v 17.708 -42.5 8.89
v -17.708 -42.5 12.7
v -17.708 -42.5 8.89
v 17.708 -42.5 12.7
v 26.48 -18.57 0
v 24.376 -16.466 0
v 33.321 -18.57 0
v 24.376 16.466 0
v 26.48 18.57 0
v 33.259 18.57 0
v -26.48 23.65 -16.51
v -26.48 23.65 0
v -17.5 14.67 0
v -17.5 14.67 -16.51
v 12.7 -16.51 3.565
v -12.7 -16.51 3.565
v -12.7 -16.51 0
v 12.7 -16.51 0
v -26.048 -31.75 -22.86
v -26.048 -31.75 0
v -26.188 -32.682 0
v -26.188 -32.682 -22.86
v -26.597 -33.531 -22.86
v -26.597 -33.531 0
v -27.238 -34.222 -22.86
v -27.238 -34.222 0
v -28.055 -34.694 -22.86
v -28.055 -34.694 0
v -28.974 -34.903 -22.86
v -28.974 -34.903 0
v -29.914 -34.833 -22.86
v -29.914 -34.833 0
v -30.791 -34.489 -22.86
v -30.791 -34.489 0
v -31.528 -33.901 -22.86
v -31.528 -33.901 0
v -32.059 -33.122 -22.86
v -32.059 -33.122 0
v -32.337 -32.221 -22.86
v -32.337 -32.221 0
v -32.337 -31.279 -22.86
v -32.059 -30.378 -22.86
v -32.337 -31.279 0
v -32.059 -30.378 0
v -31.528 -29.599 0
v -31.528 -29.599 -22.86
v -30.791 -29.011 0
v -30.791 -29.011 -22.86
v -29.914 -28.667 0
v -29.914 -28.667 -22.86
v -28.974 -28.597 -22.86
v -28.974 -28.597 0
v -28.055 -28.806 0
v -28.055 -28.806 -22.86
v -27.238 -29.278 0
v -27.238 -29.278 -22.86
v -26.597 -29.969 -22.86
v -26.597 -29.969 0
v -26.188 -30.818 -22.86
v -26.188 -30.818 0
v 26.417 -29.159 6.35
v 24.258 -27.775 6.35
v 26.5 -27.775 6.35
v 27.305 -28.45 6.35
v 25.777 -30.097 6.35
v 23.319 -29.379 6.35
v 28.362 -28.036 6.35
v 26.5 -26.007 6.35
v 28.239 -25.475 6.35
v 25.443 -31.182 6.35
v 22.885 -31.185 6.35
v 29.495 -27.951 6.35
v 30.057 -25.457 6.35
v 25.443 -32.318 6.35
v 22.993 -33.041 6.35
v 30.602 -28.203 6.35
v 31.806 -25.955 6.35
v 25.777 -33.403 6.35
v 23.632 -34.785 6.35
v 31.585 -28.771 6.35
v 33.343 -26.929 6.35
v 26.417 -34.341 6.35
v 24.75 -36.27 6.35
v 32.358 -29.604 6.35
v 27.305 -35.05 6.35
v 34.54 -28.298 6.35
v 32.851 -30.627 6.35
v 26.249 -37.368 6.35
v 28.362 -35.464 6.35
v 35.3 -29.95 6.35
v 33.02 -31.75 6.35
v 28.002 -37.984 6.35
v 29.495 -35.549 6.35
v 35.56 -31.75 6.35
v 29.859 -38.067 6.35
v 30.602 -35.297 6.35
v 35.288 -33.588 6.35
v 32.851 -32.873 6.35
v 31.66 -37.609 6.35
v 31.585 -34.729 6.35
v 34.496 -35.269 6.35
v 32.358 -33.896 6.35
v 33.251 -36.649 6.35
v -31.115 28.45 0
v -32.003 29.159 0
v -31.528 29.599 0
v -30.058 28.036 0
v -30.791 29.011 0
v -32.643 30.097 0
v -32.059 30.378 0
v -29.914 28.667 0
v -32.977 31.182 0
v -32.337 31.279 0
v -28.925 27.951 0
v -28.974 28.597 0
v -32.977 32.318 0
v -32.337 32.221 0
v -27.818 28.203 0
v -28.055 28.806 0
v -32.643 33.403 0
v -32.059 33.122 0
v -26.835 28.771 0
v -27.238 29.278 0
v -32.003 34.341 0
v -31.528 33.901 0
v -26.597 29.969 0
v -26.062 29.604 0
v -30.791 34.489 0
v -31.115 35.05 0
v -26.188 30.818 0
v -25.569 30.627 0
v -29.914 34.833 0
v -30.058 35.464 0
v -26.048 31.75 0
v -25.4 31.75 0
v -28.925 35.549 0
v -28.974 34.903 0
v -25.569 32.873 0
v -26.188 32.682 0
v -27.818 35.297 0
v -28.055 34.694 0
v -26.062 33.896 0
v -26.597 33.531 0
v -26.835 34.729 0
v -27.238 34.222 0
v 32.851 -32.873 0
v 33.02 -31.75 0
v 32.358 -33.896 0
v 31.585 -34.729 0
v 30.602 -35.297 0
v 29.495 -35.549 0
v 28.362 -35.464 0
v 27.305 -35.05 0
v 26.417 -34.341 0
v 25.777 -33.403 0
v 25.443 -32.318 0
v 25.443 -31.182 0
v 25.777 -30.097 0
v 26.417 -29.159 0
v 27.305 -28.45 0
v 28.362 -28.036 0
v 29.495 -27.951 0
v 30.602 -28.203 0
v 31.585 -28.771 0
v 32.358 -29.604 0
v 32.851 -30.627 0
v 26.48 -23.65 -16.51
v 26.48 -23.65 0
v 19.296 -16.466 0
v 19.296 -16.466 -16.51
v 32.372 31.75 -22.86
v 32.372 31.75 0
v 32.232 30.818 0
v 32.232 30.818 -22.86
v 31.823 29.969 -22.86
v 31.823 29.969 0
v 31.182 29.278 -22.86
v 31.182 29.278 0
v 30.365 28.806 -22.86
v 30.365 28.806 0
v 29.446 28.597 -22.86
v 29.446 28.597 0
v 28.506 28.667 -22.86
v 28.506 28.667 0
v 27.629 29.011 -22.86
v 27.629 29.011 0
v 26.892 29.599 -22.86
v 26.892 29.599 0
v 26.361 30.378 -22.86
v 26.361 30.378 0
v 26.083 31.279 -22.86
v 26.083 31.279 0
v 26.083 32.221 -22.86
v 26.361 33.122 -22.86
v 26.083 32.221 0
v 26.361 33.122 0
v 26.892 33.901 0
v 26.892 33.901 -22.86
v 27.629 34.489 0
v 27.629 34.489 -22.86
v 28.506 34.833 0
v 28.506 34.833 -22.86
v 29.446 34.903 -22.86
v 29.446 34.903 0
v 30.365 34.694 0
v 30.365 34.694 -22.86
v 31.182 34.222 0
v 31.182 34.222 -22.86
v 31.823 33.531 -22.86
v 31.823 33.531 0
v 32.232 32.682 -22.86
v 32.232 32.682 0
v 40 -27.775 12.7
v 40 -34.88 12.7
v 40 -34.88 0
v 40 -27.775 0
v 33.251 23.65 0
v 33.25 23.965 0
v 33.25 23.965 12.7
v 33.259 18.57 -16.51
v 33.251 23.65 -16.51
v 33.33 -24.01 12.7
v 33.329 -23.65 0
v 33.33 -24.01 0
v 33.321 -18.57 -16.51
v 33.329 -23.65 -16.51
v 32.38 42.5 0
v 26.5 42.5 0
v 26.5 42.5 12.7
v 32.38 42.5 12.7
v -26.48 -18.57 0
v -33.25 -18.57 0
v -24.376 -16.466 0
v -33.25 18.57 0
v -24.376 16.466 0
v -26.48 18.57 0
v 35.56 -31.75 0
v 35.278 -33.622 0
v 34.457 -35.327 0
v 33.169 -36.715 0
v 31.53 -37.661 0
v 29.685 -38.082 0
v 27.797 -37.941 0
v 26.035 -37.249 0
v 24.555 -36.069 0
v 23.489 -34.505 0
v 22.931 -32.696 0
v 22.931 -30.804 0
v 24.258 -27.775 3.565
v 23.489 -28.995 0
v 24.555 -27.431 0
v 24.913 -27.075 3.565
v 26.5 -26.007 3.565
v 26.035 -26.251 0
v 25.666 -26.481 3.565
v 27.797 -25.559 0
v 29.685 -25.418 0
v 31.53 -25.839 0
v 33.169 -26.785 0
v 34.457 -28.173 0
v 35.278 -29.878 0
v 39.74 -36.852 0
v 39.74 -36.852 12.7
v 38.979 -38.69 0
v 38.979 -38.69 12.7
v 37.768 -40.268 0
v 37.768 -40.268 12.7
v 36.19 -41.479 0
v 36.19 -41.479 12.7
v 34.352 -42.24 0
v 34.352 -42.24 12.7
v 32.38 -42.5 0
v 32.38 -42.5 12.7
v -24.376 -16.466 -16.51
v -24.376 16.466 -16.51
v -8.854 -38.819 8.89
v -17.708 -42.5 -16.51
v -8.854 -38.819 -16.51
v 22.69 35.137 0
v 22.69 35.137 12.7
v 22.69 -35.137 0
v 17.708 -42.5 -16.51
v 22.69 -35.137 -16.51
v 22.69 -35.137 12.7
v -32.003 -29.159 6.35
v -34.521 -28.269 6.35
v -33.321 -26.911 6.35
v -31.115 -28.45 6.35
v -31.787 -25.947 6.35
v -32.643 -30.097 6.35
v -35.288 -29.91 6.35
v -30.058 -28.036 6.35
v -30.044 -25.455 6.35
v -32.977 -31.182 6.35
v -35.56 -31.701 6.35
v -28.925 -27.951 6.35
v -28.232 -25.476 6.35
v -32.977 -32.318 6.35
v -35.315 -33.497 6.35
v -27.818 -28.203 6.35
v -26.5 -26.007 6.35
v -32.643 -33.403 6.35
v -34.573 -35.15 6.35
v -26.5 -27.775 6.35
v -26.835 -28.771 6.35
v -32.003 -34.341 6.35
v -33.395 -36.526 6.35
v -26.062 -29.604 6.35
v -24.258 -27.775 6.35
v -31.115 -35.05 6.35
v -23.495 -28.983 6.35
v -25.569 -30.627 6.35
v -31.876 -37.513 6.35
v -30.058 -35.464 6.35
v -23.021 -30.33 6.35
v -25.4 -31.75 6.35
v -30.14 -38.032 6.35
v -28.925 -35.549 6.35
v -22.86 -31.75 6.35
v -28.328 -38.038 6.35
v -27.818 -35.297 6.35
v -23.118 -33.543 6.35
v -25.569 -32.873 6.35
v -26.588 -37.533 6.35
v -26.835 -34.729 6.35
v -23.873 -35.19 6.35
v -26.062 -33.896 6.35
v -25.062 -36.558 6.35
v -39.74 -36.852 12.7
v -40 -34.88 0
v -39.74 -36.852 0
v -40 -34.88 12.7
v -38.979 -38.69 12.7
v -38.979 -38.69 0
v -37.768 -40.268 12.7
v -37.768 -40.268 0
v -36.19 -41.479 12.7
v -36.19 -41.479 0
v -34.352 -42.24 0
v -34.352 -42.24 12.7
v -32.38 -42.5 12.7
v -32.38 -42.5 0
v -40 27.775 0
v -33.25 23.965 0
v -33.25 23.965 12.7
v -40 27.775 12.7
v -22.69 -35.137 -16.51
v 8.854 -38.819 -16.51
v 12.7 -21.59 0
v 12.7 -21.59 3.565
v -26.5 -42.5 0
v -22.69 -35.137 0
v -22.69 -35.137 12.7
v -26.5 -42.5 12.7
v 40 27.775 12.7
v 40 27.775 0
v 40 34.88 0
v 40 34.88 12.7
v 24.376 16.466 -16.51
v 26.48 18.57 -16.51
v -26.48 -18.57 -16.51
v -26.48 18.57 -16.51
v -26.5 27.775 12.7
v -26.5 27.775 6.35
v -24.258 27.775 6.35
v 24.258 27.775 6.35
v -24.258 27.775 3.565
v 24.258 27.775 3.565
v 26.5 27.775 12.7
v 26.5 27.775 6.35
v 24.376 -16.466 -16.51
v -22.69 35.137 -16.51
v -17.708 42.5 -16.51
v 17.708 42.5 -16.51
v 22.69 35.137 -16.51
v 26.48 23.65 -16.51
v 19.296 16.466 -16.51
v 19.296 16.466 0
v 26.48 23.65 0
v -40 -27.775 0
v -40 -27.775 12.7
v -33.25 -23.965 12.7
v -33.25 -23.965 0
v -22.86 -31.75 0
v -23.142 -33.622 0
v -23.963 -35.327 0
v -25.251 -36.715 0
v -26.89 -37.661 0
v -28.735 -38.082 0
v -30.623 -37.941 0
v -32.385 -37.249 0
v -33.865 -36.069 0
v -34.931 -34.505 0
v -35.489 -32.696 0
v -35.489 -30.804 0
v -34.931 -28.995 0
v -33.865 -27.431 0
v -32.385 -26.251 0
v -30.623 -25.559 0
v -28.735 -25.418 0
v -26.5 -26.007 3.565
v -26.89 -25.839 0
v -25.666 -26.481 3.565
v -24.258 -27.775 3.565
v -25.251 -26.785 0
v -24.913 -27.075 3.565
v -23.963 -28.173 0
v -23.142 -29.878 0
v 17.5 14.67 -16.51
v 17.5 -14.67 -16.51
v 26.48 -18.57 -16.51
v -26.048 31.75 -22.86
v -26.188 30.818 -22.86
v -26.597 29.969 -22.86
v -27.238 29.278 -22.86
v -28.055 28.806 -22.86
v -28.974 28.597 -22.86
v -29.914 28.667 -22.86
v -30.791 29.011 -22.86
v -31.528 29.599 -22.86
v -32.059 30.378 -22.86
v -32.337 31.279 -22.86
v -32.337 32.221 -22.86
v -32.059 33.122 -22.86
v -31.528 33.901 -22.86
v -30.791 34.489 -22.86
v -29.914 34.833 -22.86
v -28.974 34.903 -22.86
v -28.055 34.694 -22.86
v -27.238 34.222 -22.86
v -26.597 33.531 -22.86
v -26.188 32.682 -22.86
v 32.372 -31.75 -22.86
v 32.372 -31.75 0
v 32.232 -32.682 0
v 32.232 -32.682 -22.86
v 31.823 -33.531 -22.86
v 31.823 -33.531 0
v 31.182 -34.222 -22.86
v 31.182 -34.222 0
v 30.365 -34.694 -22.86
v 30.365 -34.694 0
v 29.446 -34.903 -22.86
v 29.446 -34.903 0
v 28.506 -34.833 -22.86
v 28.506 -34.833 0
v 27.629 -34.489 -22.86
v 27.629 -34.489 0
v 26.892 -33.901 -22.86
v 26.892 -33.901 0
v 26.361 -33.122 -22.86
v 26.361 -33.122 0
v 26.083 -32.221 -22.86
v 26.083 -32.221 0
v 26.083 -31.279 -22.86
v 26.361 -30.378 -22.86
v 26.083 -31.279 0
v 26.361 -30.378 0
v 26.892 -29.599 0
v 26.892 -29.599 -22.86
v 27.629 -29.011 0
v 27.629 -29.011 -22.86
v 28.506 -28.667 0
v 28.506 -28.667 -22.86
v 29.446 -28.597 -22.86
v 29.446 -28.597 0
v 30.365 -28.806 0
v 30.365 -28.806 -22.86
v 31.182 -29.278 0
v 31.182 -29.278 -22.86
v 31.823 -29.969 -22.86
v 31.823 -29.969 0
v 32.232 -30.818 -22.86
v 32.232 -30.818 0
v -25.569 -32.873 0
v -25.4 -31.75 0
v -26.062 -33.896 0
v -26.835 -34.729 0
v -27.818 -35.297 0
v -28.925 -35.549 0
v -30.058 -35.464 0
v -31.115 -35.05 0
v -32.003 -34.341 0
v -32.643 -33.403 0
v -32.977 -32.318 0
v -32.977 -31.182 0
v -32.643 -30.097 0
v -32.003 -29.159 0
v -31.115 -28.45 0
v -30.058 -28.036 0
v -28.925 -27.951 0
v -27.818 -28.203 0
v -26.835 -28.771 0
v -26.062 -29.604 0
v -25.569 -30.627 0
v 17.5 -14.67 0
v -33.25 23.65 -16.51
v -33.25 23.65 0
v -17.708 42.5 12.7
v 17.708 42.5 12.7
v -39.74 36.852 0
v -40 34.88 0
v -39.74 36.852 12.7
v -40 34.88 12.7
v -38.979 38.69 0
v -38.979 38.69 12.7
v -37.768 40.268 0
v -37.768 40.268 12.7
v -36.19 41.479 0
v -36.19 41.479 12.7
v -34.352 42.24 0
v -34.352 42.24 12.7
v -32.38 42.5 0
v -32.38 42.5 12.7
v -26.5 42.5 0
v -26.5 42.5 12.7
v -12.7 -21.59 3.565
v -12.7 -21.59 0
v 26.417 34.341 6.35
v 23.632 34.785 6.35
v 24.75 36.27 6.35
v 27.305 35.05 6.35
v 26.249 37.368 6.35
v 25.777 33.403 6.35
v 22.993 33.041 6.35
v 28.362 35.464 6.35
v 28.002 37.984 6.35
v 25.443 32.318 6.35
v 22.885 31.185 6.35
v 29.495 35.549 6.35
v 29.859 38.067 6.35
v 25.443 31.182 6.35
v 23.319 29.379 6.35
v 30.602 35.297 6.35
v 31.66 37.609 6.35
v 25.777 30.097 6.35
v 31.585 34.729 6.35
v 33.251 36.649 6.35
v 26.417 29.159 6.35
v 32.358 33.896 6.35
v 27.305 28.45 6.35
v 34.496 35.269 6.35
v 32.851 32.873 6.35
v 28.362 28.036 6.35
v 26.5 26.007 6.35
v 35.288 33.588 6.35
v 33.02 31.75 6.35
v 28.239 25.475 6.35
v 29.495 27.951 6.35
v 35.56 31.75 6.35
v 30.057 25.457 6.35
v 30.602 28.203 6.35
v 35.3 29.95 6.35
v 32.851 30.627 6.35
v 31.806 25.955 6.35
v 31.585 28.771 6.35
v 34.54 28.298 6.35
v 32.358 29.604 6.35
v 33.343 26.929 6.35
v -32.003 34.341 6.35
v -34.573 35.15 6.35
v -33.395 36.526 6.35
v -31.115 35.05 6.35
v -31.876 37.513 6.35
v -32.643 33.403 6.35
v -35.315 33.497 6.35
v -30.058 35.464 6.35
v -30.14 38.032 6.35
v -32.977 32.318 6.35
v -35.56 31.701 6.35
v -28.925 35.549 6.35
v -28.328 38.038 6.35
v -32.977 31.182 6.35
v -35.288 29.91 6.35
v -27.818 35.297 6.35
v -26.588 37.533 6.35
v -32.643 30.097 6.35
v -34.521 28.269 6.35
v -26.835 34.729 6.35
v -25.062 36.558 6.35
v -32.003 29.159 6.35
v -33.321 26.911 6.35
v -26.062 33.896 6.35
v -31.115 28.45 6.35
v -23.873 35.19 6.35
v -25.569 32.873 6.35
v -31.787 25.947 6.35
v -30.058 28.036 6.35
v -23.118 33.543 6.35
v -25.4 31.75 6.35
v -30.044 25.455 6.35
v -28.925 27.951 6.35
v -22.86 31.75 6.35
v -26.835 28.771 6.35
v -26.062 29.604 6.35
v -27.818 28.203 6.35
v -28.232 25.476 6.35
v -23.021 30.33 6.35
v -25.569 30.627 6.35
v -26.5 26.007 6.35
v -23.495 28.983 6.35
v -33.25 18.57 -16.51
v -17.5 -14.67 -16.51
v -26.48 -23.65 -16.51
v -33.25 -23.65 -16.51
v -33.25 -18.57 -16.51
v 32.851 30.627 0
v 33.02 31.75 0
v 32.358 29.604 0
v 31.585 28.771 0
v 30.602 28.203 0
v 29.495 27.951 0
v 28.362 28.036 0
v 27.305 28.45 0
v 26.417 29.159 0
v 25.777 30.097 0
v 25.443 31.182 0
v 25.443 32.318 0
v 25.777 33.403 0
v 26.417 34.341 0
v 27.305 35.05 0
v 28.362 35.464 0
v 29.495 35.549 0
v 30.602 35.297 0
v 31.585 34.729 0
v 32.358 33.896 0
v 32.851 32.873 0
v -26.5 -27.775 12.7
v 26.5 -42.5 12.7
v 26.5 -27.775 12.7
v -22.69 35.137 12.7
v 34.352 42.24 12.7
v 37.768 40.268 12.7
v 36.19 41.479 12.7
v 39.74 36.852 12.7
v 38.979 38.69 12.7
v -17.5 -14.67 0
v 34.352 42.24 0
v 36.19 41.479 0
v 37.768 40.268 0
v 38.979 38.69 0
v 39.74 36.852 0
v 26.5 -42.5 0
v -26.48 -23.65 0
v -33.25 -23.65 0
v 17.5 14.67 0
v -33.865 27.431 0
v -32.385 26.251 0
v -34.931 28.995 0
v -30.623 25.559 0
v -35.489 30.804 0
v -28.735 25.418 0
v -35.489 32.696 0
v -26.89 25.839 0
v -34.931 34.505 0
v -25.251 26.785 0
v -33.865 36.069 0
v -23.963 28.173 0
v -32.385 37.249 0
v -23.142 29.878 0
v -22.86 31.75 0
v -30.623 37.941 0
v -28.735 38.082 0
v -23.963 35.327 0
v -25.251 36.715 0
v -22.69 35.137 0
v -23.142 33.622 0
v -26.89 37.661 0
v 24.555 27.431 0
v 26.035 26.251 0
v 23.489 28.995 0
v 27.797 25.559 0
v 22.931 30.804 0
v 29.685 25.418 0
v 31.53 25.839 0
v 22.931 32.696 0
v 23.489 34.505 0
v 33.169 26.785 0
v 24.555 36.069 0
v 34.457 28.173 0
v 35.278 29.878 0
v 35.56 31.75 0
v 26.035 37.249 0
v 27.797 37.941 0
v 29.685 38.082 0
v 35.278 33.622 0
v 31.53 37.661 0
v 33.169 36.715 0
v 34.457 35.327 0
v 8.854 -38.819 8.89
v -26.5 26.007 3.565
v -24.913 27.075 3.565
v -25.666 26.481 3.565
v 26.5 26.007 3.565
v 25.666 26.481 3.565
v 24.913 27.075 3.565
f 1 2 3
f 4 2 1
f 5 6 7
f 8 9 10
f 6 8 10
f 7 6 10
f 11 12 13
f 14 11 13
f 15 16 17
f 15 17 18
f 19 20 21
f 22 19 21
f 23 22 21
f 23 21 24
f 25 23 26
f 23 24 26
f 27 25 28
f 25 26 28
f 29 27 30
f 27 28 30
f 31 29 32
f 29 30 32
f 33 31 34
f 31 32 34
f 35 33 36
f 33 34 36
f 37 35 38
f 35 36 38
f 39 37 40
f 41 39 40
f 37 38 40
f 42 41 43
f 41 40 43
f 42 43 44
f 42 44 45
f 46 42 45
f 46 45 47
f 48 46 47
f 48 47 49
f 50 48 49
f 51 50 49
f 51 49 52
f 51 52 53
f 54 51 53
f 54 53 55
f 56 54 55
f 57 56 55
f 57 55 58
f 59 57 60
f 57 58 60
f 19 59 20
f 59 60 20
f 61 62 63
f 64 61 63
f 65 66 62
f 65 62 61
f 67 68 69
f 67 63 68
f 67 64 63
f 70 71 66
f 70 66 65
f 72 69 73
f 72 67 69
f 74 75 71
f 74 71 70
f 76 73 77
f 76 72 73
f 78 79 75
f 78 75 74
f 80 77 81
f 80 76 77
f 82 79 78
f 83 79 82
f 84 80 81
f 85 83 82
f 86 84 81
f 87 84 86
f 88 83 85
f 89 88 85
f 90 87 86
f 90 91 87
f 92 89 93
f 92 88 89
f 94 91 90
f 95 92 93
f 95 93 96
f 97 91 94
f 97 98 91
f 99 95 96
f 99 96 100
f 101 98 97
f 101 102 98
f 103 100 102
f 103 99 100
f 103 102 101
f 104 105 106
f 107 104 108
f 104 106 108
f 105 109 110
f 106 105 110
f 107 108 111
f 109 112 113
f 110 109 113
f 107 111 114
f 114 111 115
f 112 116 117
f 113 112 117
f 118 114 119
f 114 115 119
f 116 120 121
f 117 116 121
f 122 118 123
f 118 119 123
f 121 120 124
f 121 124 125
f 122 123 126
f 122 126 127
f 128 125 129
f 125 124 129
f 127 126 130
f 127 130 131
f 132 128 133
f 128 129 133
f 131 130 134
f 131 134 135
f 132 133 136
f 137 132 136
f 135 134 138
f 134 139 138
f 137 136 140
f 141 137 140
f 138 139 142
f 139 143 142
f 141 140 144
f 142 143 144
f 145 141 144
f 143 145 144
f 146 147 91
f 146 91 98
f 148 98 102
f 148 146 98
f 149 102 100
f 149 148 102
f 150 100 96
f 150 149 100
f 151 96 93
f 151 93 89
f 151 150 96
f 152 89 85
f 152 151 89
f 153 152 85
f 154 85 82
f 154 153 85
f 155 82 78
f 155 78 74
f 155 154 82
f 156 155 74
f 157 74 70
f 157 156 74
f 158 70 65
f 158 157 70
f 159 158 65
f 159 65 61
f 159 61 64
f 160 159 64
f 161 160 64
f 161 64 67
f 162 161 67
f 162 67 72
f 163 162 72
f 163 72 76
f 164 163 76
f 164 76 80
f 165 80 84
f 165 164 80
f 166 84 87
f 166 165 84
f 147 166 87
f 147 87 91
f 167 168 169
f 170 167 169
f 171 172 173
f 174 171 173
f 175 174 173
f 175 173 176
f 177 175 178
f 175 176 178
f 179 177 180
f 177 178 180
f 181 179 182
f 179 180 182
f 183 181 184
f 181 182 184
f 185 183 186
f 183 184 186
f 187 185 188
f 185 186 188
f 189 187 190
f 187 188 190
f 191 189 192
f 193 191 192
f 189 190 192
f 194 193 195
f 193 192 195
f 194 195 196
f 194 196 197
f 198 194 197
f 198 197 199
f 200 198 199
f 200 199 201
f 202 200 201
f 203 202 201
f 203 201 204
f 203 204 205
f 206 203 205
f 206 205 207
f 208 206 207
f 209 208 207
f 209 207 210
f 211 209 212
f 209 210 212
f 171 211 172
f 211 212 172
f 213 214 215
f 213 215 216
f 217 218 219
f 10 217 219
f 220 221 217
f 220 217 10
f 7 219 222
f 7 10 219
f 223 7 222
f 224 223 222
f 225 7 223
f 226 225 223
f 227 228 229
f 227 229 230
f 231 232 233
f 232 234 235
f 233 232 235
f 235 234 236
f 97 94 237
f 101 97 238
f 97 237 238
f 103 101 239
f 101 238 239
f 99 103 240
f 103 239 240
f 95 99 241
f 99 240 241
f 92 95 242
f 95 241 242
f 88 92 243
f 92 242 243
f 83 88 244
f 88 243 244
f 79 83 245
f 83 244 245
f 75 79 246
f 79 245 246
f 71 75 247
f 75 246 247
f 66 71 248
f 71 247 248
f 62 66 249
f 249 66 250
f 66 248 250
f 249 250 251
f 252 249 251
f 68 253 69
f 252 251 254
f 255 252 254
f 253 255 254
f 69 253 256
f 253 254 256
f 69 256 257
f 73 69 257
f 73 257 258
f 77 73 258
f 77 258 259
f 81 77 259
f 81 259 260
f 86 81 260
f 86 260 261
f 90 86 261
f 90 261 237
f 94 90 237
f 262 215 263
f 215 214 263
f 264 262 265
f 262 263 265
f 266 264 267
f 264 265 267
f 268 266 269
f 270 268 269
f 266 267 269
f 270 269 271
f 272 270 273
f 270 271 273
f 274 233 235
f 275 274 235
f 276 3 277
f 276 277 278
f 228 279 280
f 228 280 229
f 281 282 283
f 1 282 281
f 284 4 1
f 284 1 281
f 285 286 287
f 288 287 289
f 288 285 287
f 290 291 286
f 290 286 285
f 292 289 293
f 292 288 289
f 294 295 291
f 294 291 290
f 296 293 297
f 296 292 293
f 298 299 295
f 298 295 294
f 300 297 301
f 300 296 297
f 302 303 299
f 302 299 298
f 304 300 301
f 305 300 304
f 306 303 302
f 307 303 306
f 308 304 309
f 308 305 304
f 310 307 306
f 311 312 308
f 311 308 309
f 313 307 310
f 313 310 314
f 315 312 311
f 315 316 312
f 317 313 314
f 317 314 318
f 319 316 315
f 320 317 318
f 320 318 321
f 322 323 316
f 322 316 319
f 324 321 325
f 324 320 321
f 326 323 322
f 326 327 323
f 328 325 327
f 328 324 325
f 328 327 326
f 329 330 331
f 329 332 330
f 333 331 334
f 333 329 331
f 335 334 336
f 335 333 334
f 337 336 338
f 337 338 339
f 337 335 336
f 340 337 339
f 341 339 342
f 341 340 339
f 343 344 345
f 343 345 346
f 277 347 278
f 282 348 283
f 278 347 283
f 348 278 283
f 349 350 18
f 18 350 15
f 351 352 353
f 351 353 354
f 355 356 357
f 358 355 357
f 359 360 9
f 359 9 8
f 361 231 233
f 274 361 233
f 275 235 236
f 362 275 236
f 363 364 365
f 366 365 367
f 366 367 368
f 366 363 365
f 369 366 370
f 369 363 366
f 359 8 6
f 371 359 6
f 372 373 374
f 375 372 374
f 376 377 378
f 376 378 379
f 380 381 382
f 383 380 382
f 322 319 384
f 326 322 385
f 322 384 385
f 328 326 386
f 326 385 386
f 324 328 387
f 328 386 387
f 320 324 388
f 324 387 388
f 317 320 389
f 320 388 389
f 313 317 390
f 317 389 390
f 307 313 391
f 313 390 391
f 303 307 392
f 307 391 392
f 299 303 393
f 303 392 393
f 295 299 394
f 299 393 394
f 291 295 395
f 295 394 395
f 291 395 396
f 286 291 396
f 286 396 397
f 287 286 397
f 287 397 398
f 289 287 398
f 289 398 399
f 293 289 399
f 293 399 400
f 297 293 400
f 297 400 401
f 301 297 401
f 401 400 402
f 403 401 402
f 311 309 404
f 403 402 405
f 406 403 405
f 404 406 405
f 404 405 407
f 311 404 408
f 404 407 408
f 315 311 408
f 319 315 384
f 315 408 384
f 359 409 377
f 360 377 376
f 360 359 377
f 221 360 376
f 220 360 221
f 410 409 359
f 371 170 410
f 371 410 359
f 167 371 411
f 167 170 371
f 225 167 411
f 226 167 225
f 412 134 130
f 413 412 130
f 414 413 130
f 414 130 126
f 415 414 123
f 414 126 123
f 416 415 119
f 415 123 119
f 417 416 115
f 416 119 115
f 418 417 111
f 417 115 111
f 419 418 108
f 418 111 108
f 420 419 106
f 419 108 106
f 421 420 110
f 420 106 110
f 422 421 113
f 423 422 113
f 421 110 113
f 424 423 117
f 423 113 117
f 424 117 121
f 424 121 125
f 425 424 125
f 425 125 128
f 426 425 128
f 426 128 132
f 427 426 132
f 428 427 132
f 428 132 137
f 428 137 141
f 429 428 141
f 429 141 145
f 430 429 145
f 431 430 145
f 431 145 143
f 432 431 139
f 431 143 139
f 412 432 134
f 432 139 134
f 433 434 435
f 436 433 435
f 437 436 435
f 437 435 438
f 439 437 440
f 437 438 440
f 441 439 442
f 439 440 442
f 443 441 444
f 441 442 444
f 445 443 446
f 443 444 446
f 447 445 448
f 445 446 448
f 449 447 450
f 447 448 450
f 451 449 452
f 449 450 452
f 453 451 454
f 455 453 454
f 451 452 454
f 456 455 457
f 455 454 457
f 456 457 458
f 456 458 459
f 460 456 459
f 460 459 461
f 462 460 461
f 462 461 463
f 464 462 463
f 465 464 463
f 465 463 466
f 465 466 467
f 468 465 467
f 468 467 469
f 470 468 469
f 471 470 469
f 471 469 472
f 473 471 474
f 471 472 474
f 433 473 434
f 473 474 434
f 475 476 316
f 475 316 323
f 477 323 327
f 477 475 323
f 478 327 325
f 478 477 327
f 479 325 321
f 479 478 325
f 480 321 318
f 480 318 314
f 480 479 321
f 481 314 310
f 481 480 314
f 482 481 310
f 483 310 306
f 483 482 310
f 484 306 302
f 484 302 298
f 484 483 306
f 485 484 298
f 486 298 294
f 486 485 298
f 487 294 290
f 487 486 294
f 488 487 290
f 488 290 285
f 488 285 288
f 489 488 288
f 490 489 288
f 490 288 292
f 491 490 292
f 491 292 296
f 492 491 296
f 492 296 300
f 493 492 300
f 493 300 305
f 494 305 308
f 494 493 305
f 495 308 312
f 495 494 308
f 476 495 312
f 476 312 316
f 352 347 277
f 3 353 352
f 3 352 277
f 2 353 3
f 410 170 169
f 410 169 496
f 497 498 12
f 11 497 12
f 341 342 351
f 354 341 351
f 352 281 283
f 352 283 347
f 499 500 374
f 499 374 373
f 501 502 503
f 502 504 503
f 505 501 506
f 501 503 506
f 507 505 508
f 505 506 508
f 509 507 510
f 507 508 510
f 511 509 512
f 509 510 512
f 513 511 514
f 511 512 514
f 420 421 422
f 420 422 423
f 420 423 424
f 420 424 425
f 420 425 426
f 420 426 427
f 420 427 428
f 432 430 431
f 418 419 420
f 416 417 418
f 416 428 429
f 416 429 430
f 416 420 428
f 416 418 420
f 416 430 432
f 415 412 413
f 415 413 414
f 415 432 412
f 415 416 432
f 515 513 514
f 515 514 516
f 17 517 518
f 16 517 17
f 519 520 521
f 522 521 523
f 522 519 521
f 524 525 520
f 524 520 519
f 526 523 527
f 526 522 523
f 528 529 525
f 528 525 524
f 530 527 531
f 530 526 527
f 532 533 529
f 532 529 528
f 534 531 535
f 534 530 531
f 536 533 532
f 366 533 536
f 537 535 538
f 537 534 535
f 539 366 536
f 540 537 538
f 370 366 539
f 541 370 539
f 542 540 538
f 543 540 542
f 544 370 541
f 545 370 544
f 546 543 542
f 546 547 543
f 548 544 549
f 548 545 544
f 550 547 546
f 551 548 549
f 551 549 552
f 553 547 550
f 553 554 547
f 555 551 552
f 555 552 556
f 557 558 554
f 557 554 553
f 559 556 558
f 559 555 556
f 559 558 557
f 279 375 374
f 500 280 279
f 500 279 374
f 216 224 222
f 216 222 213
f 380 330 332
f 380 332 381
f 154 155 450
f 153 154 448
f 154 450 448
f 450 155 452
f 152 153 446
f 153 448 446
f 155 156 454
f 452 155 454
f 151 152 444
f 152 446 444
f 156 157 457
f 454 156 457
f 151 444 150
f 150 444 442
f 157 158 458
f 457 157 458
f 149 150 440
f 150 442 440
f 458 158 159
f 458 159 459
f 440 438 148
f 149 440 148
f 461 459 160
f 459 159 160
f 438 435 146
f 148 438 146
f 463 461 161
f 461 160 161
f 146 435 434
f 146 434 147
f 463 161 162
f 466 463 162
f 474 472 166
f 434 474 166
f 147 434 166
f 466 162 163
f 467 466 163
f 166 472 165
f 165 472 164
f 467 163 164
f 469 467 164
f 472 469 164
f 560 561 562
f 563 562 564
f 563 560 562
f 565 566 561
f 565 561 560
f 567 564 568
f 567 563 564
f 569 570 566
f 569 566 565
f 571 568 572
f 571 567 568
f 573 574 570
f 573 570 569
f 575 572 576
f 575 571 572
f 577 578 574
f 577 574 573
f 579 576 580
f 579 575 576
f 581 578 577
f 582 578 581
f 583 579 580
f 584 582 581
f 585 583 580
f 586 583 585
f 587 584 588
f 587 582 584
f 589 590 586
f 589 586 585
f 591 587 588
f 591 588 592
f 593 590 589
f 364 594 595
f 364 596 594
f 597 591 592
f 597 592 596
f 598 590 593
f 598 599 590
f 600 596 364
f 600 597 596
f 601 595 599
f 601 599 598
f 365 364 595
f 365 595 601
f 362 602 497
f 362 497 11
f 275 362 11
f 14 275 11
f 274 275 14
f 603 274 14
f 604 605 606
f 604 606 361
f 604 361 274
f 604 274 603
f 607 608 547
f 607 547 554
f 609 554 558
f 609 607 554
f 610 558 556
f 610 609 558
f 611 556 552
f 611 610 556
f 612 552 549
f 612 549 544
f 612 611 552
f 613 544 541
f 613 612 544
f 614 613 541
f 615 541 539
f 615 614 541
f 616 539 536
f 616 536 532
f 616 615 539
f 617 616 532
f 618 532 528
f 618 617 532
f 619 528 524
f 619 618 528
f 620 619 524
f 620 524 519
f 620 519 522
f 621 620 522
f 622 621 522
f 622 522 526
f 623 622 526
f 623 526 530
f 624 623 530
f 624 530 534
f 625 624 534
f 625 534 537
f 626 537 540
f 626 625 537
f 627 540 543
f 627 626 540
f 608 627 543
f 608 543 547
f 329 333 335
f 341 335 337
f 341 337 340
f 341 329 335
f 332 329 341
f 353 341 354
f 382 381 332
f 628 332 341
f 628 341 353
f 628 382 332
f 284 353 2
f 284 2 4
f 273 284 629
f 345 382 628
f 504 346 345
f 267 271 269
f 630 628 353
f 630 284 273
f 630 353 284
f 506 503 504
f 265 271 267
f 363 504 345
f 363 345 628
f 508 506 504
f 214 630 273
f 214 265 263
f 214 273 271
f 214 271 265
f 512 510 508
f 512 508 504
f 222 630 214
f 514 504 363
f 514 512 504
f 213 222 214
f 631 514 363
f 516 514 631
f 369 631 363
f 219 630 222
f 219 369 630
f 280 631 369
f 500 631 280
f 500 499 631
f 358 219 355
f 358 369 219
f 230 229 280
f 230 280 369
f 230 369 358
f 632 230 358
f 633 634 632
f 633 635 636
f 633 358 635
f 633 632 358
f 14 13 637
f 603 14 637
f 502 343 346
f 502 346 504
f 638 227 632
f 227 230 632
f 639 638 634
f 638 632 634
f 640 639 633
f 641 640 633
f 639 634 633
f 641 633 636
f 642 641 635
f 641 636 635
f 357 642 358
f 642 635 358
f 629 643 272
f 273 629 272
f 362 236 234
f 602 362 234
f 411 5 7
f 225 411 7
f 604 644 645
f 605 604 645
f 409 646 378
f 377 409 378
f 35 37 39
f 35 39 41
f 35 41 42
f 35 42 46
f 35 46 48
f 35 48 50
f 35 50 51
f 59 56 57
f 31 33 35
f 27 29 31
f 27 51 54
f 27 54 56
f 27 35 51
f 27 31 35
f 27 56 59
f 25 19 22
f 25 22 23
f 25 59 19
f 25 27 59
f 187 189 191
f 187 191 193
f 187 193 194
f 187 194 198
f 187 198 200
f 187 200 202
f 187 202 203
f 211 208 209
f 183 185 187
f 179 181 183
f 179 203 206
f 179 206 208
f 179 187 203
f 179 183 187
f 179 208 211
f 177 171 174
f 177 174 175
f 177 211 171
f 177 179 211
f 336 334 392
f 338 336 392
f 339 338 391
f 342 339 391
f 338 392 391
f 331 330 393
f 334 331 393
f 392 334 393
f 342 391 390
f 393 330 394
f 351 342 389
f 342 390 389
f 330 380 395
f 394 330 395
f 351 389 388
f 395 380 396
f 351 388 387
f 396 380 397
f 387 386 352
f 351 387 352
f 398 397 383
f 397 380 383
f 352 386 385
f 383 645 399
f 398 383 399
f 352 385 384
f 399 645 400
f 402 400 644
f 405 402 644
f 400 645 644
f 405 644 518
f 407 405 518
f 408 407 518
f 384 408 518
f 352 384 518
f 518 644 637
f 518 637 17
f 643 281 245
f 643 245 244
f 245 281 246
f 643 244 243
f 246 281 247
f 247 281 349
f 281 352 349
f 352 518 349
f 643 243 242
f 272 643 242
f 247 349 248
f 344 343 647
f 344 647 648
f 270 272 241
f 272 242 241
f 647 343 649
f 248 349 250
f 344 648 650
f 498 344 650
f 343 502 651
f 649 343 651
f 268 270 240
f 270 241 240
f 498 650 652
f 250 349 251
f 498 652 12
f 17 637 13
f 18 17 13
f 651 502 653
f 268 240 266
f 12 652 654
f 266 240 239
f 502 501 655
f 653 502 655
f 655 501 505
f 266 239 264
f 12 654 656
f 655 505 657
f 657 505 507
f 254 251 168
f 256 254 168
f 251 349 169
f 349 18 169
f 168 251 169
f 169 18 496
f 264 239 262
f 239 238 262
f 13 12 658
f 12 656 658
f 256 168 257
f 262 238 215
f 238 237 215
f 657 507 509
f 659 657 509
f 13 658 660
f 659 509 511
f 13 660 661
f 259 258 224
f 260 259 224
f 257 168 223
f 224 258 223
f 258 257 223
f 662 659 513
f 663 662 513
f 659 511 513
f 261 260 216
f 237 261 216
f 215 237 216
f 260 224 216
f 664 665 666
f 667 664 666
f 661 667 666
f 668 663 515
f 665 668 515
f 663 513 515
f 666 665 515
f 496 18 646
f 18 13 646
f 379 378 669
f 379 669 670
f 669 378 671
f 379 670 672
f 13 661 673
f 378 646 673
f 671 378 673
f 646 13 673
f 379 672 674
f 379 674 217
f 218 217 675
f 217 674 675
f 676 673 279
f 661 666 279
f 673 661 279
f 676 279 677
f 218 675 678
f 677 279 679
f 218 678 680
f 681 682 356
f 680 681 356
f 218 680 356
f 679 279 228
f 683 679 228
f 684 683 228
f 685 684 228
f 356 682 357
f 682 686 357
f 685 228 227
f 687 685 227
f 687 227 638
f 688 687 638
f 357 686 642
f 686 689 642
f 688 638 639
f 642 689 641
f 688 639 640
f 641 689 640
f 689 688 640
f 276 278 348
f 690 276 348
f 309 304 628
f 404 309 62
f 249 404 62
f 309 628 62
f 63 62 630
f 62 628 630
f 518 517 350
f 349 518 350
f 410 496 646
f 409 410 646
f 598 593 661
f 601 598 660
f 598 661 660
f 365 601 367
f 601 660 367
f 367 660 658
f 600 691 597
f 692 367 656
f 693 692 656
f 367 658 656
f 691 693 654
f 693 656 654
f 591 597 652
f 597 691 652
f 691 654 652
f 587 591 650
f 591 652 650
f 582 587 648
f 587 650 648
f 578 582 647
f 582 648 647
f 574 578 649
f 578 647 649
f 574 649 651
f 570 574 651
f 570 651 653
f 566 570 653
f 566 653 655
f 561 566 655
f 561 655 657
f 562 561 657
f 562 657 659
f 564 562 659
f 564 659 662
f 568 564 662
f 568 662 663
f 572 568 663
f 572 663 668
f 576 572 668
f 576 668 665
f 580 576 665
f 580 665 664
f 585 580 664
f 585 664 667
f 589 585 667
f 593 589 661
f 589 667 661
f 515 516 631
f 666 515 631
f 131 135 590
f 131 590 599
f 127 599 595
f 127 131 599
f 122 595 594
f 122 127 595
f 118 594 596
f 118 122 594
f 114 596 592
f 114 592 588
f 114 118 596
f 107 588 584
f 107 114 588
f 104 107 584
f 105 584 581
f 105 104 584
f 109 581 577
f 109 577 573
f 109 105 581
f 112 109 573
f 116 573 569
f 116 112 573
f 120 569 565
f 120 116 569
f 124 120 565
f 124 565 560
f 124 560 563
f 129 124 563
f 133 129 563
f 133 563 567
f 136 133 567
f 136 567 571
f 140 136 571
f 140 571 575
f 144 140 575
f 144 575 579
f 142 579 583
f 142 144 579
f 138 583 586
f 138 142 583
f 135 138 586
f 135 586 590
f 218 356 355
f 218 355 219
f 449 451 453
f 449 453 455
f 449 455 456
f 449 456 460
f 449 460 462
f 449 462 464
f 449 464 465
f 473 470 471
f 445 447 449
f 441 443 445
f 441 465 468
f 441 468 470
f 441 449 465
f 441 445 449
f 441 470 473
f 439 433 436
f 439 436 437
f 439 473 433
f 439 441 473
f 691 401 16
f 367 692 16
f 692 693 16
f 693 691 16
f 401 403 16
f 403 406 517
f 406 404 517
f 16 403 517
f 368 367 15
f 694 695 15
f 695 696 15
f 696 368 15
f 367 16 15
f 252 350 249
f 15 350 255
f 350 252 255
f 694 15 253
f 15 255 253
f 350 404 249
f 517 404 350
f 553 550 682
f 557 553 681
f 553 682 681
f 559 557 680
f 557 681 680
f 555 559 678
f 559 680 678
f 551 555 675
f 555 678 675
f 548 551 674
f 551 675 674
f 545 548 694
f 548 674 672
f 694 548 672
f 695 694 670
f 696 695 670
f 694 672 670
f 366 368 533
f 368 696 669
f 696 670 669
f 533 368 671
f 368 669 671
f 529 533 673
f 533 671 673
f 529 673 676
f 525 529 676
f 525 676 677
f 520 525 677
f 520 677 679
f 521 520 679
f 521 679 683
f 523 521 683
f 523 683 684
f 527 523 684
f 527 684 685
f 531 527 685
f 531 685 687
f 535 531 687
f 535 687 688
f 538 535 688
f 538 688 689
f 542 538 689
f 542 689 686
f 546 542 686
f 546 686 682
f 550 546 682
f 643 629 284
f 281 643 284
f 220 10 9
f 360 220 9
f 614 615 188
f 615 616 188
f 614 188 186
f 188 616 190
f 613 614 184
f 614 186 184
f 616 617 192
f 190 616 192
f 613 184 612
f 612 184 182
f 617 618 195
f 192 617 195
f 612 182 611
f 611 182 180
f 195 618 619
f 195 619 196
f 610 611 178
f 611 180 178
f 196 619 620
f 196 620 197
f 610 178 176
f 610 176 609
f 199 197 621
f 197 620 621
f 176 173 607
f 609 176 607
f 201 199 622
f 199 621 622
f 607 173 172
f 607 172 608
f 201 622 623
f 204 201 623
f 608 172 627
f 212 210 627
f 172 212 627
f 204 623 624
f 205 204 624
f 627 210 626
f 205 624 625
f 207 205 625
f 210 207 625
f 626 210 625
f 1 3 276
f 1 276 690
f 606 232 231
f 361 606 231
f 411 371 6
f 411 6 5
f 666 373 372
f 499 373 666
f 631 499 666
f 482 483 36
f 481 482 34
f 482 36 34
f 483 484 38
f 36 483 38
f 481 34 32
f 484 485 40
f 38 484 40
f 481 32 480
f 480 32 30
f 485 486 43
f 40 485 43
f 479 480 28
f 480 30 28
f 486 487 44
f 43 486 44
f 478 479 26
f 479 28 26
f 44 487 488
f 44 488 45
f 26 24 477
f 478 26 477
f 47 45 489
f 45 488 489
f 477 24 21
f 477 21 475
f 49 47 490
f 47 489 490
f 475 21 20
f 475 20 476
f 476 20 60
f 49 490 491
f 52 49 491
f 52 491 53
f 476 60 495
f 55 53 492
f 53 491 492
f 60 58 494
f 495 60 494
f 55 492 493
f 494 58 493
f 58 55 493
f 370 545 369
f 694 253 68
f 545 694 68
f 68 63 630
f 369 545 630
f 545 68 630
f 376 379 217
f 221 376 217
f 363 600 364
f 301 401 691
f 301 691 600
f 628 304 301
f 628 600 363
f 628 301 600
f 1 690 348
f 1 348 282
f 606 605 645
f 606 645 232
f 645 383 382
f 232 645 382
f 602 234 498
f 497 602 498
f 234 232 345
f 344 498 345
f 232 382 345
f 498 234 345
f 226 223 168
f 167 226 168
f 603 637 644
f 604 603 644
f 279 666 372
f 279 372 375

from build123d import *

# Parameters (mm, degrees)
F0_W      = 80
F0_H      = 85
F1_DEPTH  = 25.4
F2_W      = 53
F2_H      = 17
F3_DEPTH  = 27.7749
F4_W      = 80
F4_H      = 85
F5_DEPTH  = 12.7
F6_R      = 3.1623
F7_DEPTH  = 22.86
F8_W      = 25.4
F8_H      = 5.08
F9_DEPTH  = 25.4
F10_R     = 7.62
F11_R     = 7.62
F12_R     = 7.62
F13_R     = 7.62
F15_DEPTH = 16.51
F16_W     = 35
F16_H     = 50.8
F17_DEPTH = 25.4
F19_DEPTH = 38.1
F20_R     = 6.35
F20_R_2   = 3.81
F21_DEPTH = 6.35
F23_DEPTH = 29.21
F25_DEPTH = 25.4


with BuildPart() as f1:
    # F0 (on Top) → F1 (new body)
    with BuildSketch(Plane.XY):
        Rectangle(F0_W, F0_H)
    extrude(amount=F1_DEPTH)

    # F2 (on Front) → F3 (cut, symmetric)
    with BuildSketch(Plane.XZ):
        with Locations((0, 12.065)):
            Rectangle(F2_W, F2_H)
    extrude(amount=F3_DEPTH, both=True, mode=Mode.SUBTRACT)

    # F4 (on face) → F5 (cut)
    with BuildSketch(Plane.XY.offset(25.4)):
        Rectangle(F4_W, F4_H)
    extrude(amount=-F5_DEPTH, mode=Mode.SUBTRACT)

    # F6 (on face) → F7 (join)
    with BuildSketch(Plane(origin=(0, 0, 0), x_dir=(1, 0, 0), z_dir=(0, 0, -1))):
        with Locations((-29.21, 31.75)):
            Circle(F6_R)
        with Locations((29.21, 31.75)):
            Circle(F6_R)
        with Locations((29.21, -31.75)):
            Circle(F6_R)
        with Locations((-29.21, -31.75)):
            Circle(F6_R)
    extrude(amount=F7_DEPTH)

    # F8 (on face) → F9 (cut)
    with BuildSketch(Plane.XY.offset(3.565)):
        with Locations((0, -19.05)):
            Rectangle(F8_W, F8_H)
    extrude(amount=-F9_DEPTH, mode=Mode.SUBTRACT)

    # F10
    f10_edges = [f1.edges().sort_by_distance(p)[0] for p in [
        (-40, -42.5, 6.35),
    ]]
    fillet(f10_edges, radius=F10_R)

    # F11
    f11_edges = [f1.edges().sort_by_distance(p)[0] for p in [
        (-40, 42.5, 6.35),
    ]]
    fillet(f11_edges, radius=F11_R)

    # F12
    f12_edges = [f1.edges().sort_by_distance(p)[0] for p in [
        (40, 42.5, 6.35),
    ]]
    fillet(f12_edges, radius=F12_R)

    # F13
    f13_edges = [f1.edges().sort_by_distance(p)[0] for p in [
        (40, -42.5, 6.35),
    ]]
    fillet(f13_edges, radius=F13_R)

    # F14 (on face) → F15 (join)
    with BuildSketch(Plane(origin=(0, 0, 0), x_dir=(1, 0, 0), z_dir=(0, 0, -1))):
        Polygon((-19.2960512242, 16.4658580638), (-26.4802561211, 23.6500629607), (-34.1002561211, 23.6500629607), (-34.1002561211, 18.5700629607), (-26.4802561211, 18.5700629607), (-24.3760512242, 16.4658580638), (-24.3760512242, 8.2329290319), (-24.3760512242, 0), (-24.3760512242, -8.2329290319), (-24.3760512242, -16.4658580638), (-26.4802561211, -18.5700629607), (-34.1002561211, -18.5700629607), (-34.1002561211, -23.6500629607), (-26.4802561211, -23.6500629607), (-19.2960512242, -16.4658580638), (-17.5, -14.6698068396), (-17.5, 0), (-17.5, 14.6698068396), align=None)
        Polygon((19.2960498, -16.4658578227), (26.4802546969, -23.6500627196), (34.1002546969, -23.6500627196), (34.1002546969, -18.5700627196), (26.4802546969, -18.5700627196), (24.3760498, -16.4658578227), (24.3760498, -8.2329287908), (24.3760498, 2.411e-07), (24.3760498, 8.232929273), (24.3760498, 16.4658583049), (26.4802546969, 18.5700632018), (34.1002546969, 18.5700632018), (34.1002546969, 23.6500632018), (26.4802546969, 23.6500632018), (19.2960498, 16.4658583049), (17.5, 14.6698068396), (17.5, 0), (17.5, -14.6698068396), align=None)
    extrude(amount=F15_DEPTH)

    # F16 (on face) → F17 (cut)
    with BuildSketch(Plane(origin=(0, 0, 0), x_dir=(1, 0, 0), z_dir=(0, 0, -1))):
        Rectangle(F16_W, F16_H)
    extrude(amount=F17_DEPTH, mode=Mode.SUBTRACT)

    # F18 (on face) → F19 (cut, symmetric)
    with BuildSketch(Plane.XY.offset(3.565)):
        Polygon((-26.5, -42.5), (26.5, -42.5), (22.69, -35.13745), (-22.69, -35.13745), align=None)
        Polygon((33.3297468424, -24.0099126621), (40, -27.7749), (40, 27.7749), (33.25, 23.9649), align=None)
        Polygon((-26.5, 42.5), (-22.69, 35.13745), (22.69, 35.13745), (26.5, 42.5), align=None)
        Polygon((-33.25, -23.9649), (-33.25, 23.9649), (-40, 27.7749), (-40, -27.7749), align=None)
    extrude(amount=F19_DEPTH, both=True, mode=Mode.SUBTRACT)

    # F20 (on face) → F21 (cut)
    with BuildSketch(Plane(origin=(0, 0, 0), x_dir=(1, 0, 0), z_dir=(0, 0, -1))):
        with Locations((-29.21, 31.75)):
            Circle(F20_R)
        with Locations((-29.21, 31.75)):
            Circle(F20_R_2, mode=Mode.SUBTRACT)
        with Locations((29.21, 31.75)):
            Circle(F20_R)
        with Locations((29.21, 31.75)):
            Circle(F20_R_2, mode=Mode.SUBTRACT)
        with Locations((29.21, -31.75)):
            Circle(F20_R)
        with Locations((29.21, -31.75)):
            Circle(F20_R_2, mode=Mode.SUBTRACT)
        with Locations((-29.21, -31.75)):
            Circle(F20_R)
        with Locations((-29.21, -31.75)):
            Circle(F20_R_2, mode=Mode.SUBTRACT)
    extrude(amount=-F21_DEPTH, mode=Mode.SUBTRACT)

    # F22 (on face) → F23 (join)
    with BuildSketch(Plane.XY.offset(12.7)):
        Polygon((22.69, -35.13745), (-22.69, -35.13745), (-17.7075349979, -42.5), (17.7075349979, -42.5), align=None)
        Polygon((-17.7075349979, 42.5), (-22.69, 35.13745), (22.69, 35.13745), (17.7075349979, 42.5), align=None)
    extrude(amount=-F23_DEPTH)

    # F24 (on face) → F25 (cut)
    with BuildSketch(Plane(origin=(0, 0, -16.51), x_dir=(1, 0, 0), z_dir=(0, 0, -1))):
        Polygon((17.7075349979, 42.5), (-17.7075349979, 42.5), (-8.8537674989, 38.818725), (0, 38.818725), (8.8537674989, 38.818725), align=None)
    extrude(amount=-F25_DEPTH, mode=Mode.SUBTRACT)


solid = f1.part
